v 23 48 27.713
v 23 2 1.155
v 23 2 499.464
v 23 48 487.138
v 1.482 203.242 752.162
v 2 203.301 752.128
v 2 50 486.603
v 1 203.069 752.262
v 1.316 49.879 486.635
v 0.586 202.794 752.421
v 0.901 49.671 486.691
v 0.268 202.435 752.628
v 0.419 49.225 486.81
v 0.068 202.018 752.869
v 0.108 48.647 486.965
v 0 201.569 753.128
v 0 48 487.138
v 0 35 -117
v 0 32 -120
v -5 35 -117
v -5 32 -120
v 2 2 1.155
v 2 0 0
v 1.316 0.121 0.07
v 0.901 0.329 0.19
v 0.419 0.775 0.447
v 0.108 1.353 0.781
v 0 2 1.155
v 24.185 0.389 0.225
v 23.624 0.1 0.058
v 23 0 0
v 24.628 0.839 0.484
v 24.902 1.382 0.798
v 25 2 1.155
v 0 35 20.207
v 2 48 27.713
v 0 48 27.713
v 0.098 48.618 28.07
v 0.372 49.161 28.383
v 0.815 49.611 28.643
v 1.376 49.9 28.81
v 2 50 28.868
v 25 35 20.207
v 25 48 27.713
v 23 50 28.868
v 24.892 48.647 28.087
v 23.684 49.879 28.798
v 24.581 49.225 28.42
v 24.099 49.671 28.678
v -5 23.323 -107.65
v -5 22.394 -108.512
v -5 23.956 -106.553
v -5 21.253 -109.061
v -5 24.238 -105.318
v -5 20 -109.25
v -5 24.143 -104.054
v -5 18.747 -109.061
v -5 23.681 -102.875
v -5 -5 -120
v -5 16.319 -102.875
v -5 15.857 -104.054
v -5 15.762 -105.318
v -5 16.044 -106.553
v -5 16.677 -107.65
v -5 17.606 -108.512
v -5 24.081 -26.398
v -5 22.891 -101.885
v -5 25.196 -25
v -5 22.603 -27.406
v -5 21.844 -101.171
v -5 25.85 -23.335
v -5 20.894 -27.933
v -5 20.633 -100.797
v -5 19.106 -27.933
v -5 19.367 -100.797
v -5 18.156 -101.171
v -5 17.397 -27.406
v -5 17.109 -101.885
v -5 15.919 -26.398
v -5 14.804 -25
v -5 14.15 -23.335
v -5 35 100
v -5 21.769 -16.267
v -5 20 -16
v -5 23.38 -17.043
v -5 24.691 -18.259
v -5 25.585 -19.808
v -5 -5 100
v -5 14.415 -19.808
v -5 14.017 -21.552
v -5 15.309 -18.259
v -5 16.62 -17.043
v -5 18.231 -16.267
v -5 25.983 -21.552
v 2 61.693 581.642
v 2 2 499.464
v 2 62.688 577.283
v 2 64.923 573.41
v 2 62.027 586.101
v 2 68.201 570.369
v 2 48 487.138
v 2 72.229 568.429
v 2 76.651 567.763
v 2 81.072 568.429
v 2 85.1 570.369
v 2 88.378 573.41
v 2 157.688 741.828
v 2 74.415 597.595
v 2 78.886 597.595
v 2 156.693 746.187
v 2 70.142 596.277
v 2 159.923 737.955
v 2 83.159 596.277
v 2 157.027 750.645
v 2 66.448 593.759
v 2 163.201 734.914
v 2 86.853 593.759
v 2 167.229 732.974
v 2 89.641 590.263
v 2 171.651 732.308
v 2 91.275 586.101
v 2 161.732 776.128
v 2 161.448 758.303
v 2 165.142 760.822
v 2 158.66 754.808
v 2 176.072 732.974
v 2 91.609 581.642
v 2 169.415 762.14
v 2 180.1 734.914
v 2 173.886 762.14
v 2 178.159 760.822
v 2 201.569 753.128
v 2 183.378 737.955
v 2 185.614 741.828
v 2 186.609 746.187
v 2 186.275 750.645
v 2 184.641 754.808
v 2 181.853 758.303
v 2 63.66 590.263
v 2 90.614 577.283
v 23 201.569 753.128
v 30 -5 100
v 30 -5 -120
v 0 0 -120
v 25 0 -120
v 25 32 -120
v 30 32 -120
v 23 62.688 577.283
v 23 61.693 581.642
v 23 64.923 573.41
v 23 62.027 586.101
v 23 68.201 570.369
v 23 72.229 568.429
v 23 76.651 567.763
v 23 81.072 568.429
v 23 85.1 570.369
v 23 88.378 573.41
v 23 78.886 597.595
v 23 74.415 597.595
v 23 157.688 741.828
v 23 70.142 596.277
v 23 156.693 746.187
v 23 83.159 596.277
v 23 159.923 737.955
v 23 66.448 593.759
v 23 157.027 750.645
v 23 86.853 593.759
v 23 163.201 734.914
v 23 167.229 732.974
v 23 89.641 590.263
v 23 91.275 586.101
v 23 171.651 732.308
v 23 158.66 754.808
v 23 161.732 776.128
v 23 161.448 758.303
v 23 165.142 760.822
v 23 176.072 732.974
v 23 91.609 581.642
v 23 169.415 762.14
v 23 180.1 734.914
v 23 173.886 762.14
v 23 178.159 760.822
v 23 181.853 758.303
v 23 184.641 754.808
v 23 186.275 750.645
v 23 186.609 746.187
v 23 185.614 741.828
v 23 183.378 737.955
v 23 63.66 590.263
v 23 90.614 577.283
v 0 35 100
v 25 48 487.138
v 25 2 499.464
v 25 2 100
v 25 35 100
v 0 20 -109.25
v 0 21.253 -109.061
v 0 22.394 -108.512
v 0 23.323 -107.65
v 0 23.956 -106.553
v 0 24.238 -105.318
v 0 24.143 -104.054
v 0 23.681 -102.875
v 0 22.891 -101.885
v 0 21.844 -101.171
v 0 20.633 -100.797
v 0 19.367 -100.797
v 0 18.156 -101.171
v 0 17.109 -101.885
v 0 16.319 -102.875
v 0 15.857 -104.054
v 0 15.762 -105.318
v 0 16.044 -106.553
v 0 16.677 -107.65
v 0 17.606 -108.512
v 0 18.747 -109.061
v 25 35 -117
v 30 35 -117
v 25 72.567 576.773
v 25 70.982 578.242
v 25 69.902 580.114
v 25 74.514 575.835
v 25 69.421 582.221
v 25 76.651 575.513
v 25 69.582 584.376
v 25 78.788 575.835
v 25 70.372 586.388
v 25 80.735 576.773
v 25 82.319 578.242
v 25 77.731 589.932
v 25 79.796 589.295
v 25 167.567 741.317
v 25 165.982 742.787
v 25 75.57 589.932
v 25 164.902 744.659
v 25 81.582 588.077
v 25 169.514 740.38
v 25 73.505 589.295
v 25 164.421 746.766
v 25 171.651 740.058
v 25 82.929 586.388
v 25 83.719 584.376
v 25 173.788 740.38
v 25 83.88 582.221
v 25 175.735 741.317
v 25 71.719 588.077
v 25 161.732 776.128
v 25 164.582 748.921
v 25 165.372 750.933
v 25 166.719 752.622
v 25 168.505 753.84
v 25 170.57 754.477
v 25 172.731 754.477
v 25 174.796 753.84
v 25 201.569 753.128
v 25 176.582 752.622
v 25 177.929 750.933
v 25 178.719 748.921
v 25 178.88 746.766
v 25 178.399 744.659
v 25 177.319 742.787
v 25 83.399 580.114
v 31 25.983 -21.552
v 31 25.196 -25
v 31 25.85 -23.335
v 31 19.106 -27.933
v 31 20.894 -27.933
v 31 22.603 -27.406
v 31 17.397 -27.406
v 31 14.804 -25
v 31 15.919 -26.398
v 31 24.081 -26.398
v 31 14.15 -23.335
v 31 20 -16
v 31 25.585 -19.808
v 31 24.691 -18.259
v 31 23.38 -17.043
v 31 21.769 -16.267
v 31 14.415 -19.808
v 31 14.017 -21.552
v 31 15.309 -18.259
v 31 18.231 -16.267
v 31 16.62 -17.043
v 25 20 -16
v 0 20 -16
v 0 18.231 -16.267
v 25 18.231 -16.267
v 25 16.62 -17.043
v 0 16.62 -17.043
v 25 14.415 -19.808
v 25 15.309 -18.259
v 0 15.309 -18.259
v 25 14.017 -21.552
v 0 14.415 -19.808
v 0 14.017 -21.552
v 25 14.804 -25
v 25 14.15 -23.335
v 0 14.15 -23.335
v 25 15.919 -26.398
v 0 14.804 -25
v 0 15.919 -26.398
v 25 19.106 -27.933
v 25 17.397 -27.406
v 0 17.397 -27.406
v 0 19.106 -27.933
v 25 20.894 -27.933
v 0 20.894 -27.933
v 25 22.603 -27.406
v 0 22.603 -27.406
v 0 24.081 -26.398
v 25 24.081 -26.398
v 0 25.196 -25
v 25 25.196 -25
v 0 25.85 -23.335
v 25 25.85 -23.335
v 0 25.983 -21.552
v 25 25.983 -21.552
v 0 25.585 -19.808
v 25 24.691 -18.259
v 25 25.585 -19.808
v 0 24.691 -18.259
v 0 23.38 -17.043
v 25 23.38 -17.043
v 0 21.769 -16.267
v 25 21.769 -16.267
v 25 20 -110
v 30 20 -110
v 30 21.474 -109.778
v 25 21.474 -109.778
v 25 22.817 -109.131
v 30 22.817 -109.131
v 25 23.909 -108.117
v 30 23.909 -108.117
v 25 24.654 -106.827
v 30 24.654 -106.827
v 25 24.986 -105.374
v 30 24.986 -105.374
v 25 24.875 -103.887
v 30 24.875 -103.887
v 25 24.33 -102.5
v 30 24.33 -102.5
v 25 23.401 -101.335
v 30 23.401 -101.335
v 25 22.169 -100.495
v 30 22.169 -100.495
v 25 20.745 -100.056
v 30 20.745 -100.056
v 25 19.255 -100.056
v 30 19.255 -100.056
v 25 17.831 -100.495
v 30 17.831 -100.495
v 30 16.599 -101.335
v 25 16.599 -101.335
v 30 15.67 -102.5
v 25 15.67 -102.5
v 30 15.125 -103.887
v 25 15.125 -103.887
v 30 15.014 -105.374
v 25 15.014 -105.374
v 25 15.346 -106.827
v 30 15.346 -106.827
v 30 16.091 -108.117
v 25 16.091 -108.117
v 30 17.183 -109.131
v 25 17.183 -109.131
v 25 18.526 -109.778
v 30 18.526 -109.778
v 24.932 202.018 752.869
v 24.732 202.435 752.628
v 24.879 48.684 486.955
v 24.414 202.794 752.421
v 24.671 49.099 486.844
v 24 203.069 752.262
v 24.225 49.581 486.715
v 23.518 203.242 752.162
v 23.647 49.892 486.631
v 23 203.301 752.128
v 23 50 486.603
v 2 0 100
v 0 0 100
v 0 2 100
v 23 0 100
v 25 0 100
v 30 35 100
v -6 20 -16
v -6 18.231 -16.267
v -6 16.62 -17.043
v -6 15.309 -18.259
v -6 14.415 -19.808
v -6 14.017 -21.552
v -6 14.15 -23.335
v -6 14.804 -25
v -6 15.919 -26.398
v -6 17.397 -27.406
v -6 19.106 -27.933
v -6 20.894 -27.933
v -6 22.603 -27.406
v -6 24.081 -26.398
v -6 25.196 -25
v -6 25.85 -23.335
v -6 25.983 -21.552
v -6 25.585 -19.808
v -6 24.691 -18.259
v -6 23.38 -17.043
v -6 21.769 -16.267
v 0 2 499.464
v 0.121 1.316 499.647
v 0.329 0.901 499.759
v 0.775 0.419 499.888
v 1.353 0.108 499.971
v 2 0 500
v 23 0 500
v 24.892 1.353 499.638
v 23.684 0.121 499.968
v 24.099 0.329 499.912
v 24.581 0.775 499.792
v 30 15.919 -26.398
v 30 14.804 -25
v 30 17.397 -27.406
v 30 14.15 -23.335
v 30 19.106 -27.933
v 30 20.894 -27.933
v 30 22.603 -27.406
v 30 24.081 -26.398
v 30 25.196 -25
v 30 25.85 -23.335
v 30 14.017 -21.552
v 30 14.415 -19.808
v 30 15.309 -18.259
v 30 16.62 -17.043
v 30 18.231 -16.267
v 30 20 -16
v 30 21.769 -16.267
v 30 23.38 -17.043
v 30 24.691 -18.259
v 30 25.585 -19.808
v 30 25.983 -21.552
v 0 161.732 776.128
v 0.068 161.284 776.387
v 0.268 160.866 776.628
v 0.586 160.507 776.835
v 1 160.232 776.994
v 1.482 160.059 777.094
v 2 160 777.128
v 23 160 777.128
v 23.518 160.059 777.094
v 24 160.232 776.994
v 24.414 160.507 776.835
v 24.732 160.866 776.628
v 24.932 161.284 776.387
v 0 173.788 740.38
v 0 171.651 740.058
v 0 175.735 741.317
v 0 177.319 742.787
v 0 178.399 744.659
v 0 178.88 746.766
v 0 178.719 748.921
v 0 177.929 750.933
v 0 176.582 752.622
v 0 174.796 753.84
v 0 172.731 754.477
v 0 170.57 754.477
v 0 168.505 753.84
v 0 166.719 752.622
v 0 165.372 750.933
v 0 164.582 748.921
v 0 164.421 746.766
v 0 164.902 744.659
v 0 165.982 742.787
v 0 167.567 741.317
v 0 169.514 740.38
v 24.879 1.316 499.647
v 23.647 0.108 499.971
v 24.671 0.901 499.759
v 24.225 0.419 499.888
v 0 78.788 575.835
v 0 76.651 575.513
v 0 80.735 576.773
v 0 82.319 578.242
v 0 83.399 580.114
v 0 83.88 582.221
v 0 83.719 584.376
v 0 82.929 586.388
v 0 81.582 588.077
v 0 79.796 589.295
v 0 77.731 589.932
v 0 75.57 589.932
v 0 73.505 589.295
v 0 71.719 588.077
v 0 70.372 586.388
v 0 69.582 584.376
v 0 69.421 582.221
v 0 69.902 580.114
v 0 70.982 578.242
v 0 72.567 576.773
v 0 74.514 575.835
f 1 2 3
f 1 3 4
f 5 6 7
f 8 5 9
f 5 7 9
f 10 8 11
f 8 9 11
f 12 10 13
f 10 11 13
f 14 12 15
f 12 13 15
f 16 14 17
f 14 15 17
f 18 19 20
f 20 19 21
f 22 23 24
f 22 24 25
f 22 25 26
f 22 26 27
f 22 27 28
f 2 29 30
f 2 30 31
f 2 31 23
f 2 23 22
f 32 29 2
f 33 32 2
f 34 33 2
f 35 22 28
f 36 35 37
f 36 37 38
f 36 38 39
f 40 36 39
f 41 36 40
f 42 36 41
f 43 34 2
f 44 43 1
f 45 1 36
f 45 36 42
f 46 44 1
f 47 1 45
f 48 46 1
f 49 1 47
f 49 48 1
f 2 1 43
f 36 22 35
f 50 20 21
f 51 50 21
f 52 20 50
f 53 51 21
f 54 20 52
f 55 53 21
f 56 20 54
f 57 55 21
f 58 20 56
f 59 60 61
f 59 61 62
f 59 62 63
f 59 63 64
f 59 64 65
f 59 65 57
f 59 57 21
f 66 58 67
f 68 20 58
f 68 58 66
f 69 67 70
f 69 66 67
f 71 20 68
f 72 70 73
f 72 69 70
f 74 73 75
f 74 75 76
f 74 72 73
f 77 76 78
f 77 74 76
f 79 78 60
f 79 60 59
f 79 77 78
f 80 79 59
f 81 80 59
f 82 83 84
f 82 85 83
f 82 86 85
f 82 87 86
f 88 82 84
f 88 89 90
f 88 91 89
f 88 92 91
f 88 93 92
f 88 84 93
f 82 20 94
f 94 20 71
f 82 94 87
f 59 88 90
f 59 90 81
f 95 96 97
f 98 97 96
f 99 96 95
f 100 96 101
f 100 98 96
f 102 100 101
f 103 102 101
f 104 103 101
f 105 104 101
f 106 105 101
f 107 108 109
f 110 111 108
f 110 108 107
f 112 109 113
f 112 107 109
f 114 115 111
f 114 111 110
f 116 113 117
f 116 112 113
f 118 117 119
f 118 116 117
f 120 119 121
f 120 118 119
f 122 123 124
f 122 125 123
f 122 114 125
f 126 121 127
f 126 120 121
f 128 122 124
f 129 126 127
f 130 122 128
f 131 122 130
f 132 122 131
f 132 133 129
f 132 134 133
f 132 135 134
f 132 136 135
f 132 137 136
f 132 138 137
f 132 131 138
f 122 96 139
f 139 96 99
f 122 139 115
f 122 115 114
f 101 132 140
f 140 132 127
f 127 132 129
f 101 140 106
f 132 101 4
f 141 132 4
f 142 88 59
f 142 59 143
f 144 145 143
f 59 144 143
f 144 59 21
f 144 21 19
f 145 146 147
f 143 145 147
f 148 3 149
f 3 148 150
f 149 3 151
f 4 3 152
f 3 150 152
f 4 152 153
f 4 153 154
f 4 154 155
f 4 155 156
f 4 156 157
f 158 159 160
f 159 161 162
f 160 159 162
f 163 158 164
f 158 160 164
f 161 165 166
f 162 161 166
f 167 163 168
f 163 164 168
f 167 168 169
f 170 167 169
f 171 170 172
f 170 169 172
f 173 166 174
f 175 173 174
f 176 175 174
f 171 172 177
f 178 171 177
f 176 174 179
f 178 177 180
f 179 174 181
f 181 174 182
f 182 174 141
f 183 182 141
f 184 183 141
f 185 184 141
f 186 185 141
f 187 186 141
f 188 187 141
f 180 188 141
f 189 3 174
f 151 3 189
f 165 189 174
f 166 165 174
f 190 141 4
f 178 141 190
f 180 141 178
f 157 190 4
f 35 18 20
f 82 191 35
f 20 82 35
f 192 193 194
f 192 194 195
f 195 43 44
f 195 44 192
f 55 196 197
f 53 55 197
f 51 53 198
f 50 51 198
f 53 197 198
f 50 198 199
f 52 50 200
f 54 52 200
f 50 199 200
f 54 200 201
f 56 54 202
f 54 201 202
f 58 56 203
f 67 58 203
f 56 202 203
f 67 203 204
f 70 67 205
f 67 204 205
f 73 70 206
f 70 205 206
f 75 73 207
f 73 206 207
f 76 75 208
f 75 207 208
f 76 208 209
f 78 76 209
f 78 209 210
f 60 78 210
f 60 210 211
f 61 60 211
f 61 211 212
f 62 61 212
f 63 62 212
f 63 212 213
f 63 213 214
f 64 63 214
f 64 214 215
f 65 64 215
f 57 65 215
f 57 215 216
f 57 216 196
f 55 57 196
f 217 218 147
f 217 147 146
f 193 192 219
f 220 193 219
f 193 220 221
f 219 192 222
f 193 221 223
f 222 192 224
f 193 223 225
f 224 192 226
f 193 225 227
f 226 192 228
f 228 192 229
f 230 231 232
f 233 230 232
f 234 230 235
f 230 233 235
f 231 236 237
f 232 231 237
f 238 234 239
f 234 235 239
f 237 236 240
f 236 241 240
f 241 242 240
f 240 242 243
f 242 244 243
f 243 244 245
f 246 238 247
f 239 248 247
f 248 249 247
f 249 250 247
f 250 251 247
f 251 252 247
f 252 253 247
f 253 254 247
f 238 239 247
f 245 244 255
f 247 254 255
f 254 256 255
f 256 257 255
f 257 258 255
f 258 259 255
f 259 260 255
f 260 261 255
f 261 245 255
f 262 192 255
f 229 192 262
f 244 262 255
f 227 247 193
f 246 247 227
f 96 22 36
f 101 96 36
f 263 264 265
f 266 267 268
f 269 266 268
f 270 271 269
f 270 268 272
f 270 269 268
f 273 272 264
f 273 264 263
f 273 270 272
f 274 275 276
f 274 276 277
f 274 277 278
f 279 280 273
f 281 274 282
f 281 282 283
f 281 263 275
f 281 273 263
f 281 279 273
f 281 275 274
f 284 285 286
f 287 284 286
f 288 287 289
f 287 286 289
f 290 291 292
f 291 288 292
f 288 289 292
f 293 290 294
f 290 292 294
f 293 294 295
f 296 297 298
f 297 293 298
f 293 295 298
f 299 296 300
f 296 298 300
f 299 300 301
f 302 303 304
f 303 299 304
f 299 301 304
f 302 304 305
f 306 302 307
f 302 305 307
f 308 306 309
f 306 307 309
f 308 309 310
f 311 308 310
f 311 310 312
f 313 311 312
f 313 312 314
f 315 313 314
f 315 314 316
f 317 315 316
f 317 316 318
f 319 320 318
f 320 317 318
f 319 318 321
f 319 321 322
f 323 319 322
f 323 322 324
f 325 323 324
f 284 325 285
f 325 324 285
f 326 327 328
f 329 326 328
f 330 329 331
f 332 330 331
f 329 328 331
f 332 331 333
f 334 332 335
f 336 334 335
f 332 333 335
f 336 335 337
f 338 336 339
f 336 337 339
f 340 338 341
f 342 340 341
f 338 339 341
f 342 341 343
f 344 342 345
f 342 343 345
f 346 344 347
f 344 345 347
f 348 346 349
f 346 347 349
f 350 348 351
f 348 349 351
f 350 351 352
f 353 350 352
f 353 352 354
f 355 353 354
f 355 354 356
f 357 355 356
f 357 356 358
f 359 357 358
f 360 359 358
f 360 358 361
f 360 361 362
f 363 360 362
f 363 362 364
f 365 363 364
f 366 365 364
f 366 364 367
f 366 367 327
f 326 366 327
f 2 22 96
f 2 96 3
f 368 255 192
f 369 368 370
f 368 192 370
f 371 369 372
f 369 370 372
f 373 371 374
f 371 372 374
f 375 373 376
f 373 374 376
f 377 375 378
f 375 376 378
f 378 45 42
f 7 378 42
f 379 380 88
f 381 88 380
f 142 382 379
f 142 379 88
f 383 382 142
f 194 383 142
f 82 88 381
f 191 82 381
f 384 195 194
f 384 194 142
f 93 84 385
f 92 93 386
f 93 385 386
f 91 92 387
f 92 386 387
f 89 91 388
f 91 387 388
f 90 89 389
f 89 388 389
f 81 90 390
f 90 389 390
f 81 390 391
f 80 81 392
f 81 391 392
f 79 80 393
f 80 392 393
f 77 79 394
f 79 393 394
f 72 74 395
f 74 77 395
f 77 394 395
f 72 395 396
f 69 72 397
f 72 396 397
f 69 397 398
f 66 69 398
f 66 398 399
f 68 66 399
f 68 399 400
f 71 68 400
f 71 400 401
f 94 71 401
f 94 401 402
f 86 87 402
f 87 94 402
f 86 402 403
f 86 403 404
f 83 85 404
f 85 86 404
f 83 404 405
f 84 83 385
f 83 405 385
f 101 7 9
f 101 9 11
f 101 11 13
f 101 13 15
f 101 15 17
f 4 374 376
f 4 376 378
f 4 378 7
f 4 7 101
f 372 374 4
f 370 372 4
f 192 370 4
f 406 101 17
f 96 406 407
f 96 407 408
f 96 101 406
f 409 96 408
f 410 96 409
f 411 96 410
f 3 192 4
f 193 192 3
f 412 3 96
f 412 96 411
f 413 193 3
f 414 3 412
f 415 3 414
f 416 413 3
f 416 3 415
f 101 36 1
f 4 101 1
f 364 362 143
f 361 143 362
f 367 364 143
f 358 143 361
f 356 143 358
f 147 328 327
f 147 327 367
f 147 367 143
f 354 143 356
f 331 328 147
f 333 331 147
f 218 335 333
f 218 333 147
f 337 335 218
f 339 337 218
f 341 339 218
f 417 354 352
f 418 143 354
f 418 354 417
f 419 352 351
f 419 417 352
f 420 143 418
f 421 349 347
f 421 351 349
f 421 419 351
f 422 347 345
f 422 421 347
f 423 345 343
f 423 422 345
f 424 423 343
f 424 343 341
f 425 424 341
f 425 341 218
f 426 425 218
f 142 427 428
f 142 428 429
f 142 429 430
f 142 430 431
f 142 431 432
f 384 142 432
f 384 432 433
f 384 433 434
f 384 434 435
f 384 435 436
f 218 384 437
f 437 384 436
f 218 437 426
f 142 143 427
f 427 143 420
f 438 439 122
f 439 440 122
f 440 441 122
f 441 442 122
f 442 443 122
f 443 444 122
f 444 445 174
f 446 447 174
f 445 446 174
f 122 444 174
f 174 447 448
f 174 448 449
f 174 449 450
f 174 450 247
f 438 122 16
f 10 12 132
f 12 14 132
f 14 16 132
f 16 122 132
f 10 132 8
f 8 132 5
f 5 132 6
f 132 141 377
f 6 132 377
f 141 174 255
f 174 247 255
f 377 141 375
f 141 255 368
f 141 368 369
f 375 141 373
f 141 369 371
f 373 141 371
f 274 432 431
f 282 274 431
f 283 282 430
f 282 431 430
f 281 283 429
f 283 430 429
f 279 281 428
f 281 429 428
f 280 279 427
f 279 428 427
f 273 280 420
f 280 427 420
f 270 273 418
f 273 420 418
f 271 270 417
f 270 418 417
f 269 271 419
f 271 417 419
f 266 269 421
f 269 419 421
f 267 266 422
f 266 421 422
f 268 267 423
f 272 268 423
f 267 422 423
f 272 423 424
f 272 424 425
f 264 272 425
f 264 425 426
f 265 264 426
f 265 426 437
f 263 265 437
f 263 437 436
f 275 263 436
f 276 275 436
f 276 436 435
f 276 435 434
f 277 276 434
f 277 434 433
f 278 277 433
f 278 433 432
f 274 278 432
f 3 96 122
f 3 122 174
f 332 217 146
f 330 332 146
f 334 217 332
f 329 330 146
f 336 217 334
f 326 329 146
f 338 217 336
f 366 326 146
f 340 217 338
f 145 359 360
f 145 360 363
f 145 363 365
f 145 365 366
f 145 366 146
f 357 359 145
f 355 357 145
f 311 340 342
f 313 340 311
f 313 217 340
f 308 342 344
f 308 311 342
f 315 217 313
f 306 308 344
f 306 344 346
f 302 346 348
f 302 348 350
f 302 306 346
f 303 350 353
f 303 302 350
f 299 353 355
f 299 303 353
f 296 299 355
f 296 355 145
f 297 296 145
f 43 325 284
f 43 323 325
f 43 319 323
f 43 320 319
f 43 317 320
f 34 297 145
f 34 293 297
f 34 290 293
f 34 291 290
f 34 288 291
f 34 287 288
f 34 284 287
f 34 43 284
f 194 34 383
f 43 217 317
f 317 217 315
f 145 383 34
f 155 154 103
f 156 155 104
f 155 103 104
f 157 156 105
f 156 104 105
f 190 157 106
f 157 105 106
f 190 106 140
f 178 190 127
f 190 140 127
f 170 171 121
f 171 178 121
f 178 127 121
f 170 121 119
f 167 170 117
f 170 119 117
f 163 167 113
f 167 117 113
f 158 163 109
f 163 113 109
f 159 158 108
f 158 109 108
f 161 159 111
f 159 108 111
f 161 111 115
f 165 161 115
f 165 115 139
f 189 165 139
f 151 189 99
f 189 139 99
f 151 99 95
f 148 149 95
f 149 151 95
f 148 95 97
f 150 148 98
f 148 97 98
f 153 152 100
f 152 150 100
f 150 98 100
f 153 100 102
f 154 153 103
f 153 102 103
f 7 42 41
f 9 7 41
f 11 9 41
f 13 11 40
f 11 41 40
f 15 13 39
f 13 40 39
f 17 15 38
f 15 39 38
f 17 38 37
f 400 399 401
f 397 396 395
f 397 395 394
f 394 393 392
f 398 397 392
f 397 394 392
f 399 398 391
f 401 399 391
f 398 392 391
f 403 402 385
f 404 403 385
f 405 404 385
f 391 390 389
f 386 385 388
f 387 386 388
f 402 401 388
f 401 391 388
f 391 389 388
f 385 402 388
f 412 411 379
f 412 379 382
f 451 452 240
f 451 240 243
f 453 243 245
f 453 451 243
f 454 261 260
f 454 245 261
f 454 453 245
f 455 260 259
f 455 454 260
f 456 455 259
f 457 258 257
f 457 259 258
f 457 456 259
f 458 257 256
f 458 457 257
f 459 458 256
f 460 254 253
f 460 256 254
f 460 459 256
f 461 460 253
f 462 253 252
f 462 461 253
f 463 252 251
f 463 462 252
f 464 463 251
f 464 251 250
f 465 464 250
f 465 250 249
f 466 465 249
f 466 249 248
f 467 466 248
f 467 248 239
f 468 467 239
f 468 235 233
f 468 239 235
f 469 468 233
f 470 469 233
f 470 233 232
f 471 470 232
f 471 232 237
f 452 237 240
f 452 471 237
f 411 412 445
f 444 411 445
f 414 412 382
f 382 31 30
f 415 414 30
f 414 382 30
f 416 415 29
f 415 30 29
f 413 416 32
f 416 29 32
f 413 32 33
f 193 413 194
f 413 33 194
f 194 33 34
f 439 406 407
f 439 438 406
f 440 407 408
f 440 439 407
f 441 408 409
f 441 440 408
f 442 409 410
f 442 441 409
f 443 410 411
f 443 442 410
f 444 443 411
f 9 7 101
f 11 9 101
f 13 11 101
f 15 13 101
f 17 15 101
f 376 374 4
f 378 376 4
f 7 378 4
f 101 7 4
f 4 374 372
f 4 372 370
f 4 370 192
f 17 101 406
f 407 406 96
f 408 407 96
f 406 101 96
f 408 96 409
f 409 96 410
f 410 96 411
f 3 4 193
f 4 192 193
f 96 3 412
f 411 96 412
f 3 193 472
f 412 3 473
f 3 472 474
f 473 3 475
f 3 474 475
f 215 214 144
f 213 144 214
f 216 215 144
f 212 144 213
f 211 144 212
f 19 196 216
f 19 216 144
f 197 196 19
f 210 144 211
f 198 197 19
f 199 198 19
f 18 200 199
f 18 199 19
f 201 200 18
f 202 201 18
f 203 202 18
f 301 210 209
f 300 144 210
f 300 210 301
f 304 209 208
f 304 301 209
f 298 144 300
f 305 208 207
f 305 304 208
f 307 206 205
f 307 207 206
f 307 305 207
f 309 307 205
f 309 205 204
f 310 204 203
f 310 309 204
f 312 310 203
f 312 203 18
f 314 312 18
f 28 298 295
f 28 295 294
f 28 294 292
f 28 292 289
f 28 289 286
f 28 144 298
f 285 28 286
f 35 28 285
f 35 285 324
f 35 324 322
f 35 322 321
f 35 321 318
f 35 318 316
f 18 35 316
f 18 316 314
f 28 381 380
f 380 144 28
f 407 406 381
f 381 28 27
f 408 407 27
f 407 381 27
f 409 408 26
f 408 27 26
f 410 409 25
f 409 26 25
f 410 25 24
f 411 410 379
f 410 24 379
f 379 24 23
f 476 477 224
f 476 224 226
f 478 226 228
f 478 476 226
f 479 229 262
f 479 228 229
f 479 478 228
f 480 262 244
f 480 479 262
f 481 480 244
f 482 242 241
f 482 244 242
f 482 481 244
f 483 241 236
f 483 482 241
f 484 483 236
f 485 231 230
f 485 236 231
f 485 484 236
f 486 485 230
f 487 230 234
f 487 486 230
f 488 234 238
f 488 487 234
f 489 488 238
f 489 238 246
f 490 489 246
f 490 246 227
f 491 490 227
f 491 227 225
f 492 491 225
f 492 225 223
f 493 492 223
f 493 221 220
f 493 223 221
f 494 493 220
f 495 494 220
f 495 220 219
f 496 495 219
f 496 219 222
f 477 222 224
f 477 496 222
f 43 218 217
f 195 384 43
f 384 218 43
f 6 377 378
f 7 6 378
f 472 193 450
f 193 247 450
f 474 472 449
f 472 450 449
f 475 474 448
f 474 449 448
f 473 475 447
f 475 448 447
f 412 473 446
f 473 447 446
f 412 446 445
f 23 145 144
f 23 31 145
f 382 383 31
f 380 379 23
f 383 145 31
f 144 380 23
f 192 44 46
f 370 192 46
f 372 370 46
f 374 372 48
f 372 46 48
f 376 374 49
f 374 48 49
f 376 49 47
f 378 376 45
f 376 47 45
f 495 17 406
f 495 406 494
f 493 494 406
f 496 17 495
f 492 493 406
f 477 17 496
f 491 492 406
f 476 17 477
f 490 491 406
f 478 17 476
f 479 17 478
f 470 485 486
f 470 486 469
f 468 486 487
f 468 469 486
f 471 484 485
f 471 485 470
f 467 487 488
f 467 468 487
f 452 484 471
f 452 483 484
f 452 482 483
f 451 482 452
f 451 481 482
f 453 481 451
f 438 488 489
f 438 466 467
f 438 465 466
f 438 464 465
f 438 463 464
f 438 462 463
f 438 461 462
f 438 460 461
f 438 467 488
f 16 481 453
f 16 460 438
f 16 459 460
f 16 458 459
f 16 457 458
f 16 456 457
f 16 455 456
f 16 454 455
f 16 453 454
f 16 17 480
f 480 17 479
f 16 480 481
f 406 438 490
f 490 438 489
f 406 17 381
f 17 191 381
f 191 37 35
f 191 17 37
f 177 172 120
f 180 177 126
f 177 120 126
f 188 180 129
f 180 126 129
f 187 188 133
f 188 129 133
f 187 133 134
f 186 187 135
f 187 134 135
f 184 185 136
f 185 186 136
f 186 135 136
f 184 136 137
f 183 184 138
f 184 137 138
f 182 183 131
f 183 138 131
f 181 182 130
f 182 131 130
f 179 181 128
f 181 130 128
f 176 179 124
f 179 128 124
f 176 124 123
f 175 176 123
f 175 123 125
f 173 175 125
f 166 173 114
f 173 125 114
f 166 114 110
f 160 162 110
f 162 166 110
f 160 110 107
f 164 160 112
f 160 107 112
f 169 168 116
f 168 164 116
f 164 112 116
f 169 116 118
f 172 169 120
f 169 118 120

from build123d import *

# Parameters (mm, degrees)
SCHIZZO1_W                               = 21
SCHIZZO1_H                               = 46
ESTRUSIONE_SOTTILE1_DEPTH                = 500
TAGLIO_ESTRUSIONE1_DEPTH                 = 504.115294937
ESTRUSIONE_SOTTILE2_DEPTH                = 120
ESTRUSIONE_SOTTILE2_DEPTH_BACK           = 100
ESTRUSIONE_ESTRUSIONE3_DEPTH             = 1
ESTRUSIONE_ESTRUSIONE3_DEPTH_BACK        = 36
SCHIZZO6_R                               = 6
SCHIZZO7_R                               = 5
TAGLIO_ESTRUSIONE2_DEPTH                 = 10
SMUSSO1_SIZE                             = 3
TAGLIO_ESTRUSIONE3_DEPTH                 = 25
M10_TAPPED_HOLE1_D                       = 8.5
M10_TAPPED_HOLE1_DEPTH                   = 27.5
M10_TAPPED_HOLE1_TIP                     = 2.553657631
ESTRUSIONE_ESTRUSIONE5_DEPTH             = 12.5
RACCORDO1_R                              = 2
SCHIZZO12_W                              = 21
SCHIZZO12_H                              = 46
TAGLIO_ESTRUSIONE4_DEPTH                 = 862.794606464
TAGLIO_ESTRUSIONE5_DEPTH                 = 804.493488257
TAGLIO_ESTRUSIONE5_DEPTH_BACK            = 804.493488257
SCHIZZO13_R                              = 7.25
ESTRUSIONE_ESTRUSIONE6_REACH             = 805.493
SCHIZZO14_R                              = 15
SCHIZZO14_R_2                            = 7.25
ESTRUSIONE_ESTRUSIONE6_DIRECTION_2_REACH = 805.493


with BuildPart() as part:
    # Schizzo1 → Estrusione-Sottile1 (new body)
    with BuildSketch(Plane.XY):
        with BuildLine():
            Line((0, 48), (0, 2))
            ThreePointArc((0, 2), (0.585786438, 0.585786438), (2, 0))
            Line((2, 0), (23, 0))
            ThreePointArc((23, 0), (24.414213562, 0.585786438), (25, 2))
            Line((25, 2), (25, 48))
            ThreePointArc((25, 48), (24.414213562, 49.414213562), (23, 50))
            Line((23, 50), (2, 50))
            ThreePointArc((2, 50), (0.585786438, 49.414213562), (0, 48))
        make_face()
        with Locations((12.5, 25)):
            Rectangle(SCHIZZO1_W, SCHIZZO1_H, mode=Mode.SUBTRACT)
    extrude(amount=ESTRUSIONE_SOTTILE1_DEPTH)

    # Schizzo2 → Taglio-Estrusione1 (cut, through all)
    with BuildSketch(Plane(origin=(25, 0, 0), x_dir=(0, 0, -1), z_dir=(1, 0, 0))):
        Polygon((-500, 0), (-500, 50), (-486.602540378, 50), align=None)
    extrude(amount=-TAGLIO_ESTRUSIONE1_DEPTH, mode=Mode.SUBTRACT)

    # Schizzo5 → Estrusione-Sottile2 (add, two sides: drawn at the far end of the back side and taken through both)
    with BuildSketch(Plane(origin=(0, 0, 0), x_dir=(-1, 0, 0), z_dir=(0, 0, -1)).offset(-ESTRUSIONE_SOTTILE2_DEPTH_BACK)):
        Polygon((-25, 35), (-25, 0), (0, 0), (0, 35), (5, 35), (5, -5), (-30, -5), (-30, 35), align=None)
    extrude(amount=ESTRUSIONE_SOTTILE2_DEPTH + ESTRUSIONE_SOTTILE2_DEPTH_BACK)

    # Schizzo6 → Estrusione-Estrusione3 (add, two sides: drawn at the far end of the back side and taken through both)
    with BuildSketch(Plane(origin=(30, 0, 0), x_dir=(0, 0, -1), z_dir=(1, 0, 0)).offset(-ESTRUSIONE_ESTRUSIONE3_DEPTH_BACK)):
        with Locations((22, 20)):
            Circle(SCHIZZO6_R)
    extrude(amount=ESTRUSIONE_ESTRUSIONE3_DEPTH + ESTRUSIONE_ESTRUSIONE3_DEPTH_BACK)

    # Schizzo7 → Taglio-Estrusione2 (cut)
    with BuildSketch(Plane(origin=(30, 0, 0), x_dir=(0, 0, -1), z_dir=(1, 0, 0))):
        with Locations((105, 20)):
            Circle(SCHIZZO7_R)
    extrude(amount=-TAGLIO_ESTRUSIONE2_DEPTH, mode=Mode.SUBTRACT)

    # Smusso1
    smusso1_edges = [part.edges().sort_by_distance(p)[0] for p in [
        (-2.5, 35, -120),
        (27.5, 35, -120),
    ]]
    chamfer(smusso1_edges, length=SMUSSO1_SIZE)

    # Schizzo8 → Taglio-Estrusione3 (cut)
    with BuildSketch(Plane(origin=(25, 0, 0), x_dir=(0, 0, -1), z_dir=(1, 0, 0))):
        Polygon((0, 0), (-28.867513459, 50), (0, 50), align=None)
    extrude(amount=-TAGLIO_ESTRUSIONE3_DEPTH, mode=Mode.SUBTRACT)

    # M10 Tapped Hole1
    with Locations(Plane.ZY.offset(5)):
        with Locations((-105, 20)):
            Hole(M10_TAPPED_HOLE1_D / 2, depth=M10_TAPPED_HOLE1_DEPTH)
            with Locations((0, 0, -(M10_TAPPED_HOLE1_DEPTH + M10_TAPPED_HOLE1_TIP / 2))):  # 118° drill point
                Cone(0, M10_TAPPED_HOLE1_D / 2, M10_TAPPED_HOLE1_TIP, mode=Mode.SUBTRACT)


with BuildPart() as body_2:
    # Schizzo11 → Estrusione-Estrusione5 (new, symmetric)
    with BuildSketch(Plane(origin=(12.5, 0, 0), x_dir=(0, 0, -1), z_dir=(1, 0, 0))):
        Polygon((-777.128129211, 160), (-752.128129211, 203.301270189), (-486.602540378, 50), (-500, 0), align=None)
    extrude(amount=ESTRUSIONE_ESTRUSIONE5_DEPTH, both=True)

    # Raccordo1
    raccordo1_edges = [body_2.edges().sort_by_distance(p)[0] for p in [
        (0, 80, 638.564064606),
        (25, 80, 638.564064606),
        (0, 126.650635095, 619.365334795),
        (25, 126.650635095, 619.365334795),
    ]]
    fillet(raccordo1_edges, radius=RACCORDO1_R)

    # Schizzo12 → Taglio-Estrusione4 (cut, through all)
    with BuildSketch(Plane(origin=(0, 376.506350946, 652.128129211), x_dir=(1, 0, 0), z_dir=(0, 0.4999999999999913, 0.8660254037844438))):
        with Locations((12.5, -225)):
            Rectangle(SCHIZZO12_W, SCHIZZO12_H)
    extrude(amount=-TAGLIO_ESTRUSIONE4_DEPTH, mode=Mode.SUBTRACT)

    # Schizzo13 → Taglio-Estrusione5 (cut, two sides: drawn at the far end of the back side and taken through both)
    with BuildSketch(Plane(origin=(12.5, 0, 0), x_dir=(0, 0, -1), z_dir=(1, 0, 0)).offset(-TAGLIO_ESTRUSIONE5_DEPTH_BACK)):
        with Locations((-747.307621135, 171.650635095)):
            Circle(SCHIZZO13_R)
        with Locations((-582.762794416, 76.650635095)):
            Circle(SCHIZZO13_R)
    extrude(amount=TAGLIO_ESTRUSIONE5_DEPTH + TAGLIO_ESTRUSIONE5_DEPTH_BACK, mode=Mode.SUBTRACT)

    # Estrusione-Estrusione6: up to this face of the body (flat: up to its plane)
    estrusione_estrusione6_end = Plane(body_2.part.faces().sort_by_distance((2, 102.692889262, 628.177991904))[0])
    # Schizzo14 → Estrusione-Estrusione6 (add, up to the picked face)
    with BuildSketch(Plane(origin=(12.5, 0, 0), x_dir=(0, 0, -1), z_dir=(1, 0, 0)), mode=Mode.PRIVATE) as estrusione_estrusione6_sk1:
        with Locations((-747.307621135, 171.650635095)):
            Circle(SCHIZZO14_R)
        with Locations((-747.307621135, 171.650635095)):
            Circle(SCHIZZO14_R_2, mode=Mode.SUBTRACT)
    estrusione_estrusione6_tool1 = split(extrude(estrusione_estrusione6_sk1.sketch, amount=-ESTRUSIONE_ESTRUSIONE6_REACH, mode=Mode.PRIVATE), bisect_by=estrusione_estrusione6_end, keep=Keep.BOTH, mode=Mode.PRIVATE)
    # Schizzo14 → Estrusione-Estrusione6 (add, up to the picked face)
    with BuildSketch(Plane(origin=(12.5, 0, 0), x_dir=(0, 0, -1), z_dir=(1, 0, 0)), mode=Mode.PRIVATE) as estrusione_estrusione6_sk2:
        with Locations((-582.762794416, 76.650635095)):
            Circle(SCHIZZO14_R)
        with Locations((-582.762794416, 76.650635095)):
            Circle(SCHIZZO14_R_2, mode=Mode.SUBTRACT)
    estrusione_estrusione6_tool2 = split(extrude(estrusione_estrusione6_sk2.sketch, amount=-ESTRUSIONE_ESTRUSIONE6_REACH, mode=Mode.PRIVATE), bisect_by=estrusione_estrusione6_end, keep=Keep.BOTH, mode=Mode.PRIVATE)
    add(estrusione_estrusione6_tool1.solids().sort_by(Axis((12.5, 171.650635, 761.883357), (-1, 0, 0)))[0])
    add(estrusione_estrusione6_tool2.solids().sort_by(Axis((12.5, 76.650635, 597.33853), (-1, 0, 0)))[0])

    # Estrusione-Estrusione6 direction 2: up to this face of the body (flat: up to its plane)
    estrusione_estrusione6_direction_2_end = Plane(body_2.part.faces().sort_by_distance((23, 102.692889262, 628.177991904))[0])
    # Schizzo14 → Estrusione-Estrusione6 direction 2 (add, up to the picked face)
    with BuildSketch(Plane(origin=(12.5, 0, 0), x_dir=(0, 0, -1), z_dir=(1, 0, 0)), mode=Mode.PRIVATE) as estrusione_estrusione6_direction_2_sk1:
        with Locations((-747.307621135, 171.650635095)):
            Circle(SCHIZZO14_R)
        with Locations((-747.307621135, 171.650635095)):
            Circle(SCHIZZO14_R_2, mode=Mode.SUBTRACT)
    estrusione_estrusione6_direction_2_tool1 = split(extrude(estrusione_estrusione6_direction_2_sk1.sketch, amount=ESTRUSIONE_ESTRUSIONE6_DIRECTION_2_REACH, mode=Mode.PRIVATE), bisect_by=estrusione_estrusione6_direction_2_end, keep=Keep.BOTH, mode=Mode.PRIVATE)
    # Schizzo14 → Estrusione-Estrusione6 direction 2 (add, up to the picked face)
    with BuildSketch(Plane(origin=(12.5, 0, 0), x_dir=(0, 0, -1), z_dir=(1, 0, 0)), mode=Mode.PRIVATE) as estrusione_estrusione6_direction_2_sk2:
        with Locations((-582.762794416, 76.650635095)):
            Circle(SCHIZZO14_R)
        with Locations((-582.762794416, 76.650635095)):
            Circle(SCHIZZO14_R_2, mode=Mode.SUBTRACT)
    estrusione_estrusione6_direction_2_tool2 = split(extrude(estrusione_estrusione6_direction_2_sk2.sketch, amount=ESTRUSIONE_ESTRUSIONE6_DIRECTION_2_REACH, mode=Mode.PRIVATE), bisect_by=estrusione_estrusione6_direction_2_end, keep=Keep.BOTH, mode=Mode.PRIVATE)
    add(estrusione_estrusione6_direction_2_tool1.solids().sort_by(Axis((12.5, 171.650635, 761.883357), (1, 0, 0)))[0])
    add(estrusione_estrusione6_direction_2_tool2.solids().sort_by(Axis((12.5, 76.650635, 597.33853), (1, 0, 0)))[0])


solid = Compound([part.part, body_2.part])
